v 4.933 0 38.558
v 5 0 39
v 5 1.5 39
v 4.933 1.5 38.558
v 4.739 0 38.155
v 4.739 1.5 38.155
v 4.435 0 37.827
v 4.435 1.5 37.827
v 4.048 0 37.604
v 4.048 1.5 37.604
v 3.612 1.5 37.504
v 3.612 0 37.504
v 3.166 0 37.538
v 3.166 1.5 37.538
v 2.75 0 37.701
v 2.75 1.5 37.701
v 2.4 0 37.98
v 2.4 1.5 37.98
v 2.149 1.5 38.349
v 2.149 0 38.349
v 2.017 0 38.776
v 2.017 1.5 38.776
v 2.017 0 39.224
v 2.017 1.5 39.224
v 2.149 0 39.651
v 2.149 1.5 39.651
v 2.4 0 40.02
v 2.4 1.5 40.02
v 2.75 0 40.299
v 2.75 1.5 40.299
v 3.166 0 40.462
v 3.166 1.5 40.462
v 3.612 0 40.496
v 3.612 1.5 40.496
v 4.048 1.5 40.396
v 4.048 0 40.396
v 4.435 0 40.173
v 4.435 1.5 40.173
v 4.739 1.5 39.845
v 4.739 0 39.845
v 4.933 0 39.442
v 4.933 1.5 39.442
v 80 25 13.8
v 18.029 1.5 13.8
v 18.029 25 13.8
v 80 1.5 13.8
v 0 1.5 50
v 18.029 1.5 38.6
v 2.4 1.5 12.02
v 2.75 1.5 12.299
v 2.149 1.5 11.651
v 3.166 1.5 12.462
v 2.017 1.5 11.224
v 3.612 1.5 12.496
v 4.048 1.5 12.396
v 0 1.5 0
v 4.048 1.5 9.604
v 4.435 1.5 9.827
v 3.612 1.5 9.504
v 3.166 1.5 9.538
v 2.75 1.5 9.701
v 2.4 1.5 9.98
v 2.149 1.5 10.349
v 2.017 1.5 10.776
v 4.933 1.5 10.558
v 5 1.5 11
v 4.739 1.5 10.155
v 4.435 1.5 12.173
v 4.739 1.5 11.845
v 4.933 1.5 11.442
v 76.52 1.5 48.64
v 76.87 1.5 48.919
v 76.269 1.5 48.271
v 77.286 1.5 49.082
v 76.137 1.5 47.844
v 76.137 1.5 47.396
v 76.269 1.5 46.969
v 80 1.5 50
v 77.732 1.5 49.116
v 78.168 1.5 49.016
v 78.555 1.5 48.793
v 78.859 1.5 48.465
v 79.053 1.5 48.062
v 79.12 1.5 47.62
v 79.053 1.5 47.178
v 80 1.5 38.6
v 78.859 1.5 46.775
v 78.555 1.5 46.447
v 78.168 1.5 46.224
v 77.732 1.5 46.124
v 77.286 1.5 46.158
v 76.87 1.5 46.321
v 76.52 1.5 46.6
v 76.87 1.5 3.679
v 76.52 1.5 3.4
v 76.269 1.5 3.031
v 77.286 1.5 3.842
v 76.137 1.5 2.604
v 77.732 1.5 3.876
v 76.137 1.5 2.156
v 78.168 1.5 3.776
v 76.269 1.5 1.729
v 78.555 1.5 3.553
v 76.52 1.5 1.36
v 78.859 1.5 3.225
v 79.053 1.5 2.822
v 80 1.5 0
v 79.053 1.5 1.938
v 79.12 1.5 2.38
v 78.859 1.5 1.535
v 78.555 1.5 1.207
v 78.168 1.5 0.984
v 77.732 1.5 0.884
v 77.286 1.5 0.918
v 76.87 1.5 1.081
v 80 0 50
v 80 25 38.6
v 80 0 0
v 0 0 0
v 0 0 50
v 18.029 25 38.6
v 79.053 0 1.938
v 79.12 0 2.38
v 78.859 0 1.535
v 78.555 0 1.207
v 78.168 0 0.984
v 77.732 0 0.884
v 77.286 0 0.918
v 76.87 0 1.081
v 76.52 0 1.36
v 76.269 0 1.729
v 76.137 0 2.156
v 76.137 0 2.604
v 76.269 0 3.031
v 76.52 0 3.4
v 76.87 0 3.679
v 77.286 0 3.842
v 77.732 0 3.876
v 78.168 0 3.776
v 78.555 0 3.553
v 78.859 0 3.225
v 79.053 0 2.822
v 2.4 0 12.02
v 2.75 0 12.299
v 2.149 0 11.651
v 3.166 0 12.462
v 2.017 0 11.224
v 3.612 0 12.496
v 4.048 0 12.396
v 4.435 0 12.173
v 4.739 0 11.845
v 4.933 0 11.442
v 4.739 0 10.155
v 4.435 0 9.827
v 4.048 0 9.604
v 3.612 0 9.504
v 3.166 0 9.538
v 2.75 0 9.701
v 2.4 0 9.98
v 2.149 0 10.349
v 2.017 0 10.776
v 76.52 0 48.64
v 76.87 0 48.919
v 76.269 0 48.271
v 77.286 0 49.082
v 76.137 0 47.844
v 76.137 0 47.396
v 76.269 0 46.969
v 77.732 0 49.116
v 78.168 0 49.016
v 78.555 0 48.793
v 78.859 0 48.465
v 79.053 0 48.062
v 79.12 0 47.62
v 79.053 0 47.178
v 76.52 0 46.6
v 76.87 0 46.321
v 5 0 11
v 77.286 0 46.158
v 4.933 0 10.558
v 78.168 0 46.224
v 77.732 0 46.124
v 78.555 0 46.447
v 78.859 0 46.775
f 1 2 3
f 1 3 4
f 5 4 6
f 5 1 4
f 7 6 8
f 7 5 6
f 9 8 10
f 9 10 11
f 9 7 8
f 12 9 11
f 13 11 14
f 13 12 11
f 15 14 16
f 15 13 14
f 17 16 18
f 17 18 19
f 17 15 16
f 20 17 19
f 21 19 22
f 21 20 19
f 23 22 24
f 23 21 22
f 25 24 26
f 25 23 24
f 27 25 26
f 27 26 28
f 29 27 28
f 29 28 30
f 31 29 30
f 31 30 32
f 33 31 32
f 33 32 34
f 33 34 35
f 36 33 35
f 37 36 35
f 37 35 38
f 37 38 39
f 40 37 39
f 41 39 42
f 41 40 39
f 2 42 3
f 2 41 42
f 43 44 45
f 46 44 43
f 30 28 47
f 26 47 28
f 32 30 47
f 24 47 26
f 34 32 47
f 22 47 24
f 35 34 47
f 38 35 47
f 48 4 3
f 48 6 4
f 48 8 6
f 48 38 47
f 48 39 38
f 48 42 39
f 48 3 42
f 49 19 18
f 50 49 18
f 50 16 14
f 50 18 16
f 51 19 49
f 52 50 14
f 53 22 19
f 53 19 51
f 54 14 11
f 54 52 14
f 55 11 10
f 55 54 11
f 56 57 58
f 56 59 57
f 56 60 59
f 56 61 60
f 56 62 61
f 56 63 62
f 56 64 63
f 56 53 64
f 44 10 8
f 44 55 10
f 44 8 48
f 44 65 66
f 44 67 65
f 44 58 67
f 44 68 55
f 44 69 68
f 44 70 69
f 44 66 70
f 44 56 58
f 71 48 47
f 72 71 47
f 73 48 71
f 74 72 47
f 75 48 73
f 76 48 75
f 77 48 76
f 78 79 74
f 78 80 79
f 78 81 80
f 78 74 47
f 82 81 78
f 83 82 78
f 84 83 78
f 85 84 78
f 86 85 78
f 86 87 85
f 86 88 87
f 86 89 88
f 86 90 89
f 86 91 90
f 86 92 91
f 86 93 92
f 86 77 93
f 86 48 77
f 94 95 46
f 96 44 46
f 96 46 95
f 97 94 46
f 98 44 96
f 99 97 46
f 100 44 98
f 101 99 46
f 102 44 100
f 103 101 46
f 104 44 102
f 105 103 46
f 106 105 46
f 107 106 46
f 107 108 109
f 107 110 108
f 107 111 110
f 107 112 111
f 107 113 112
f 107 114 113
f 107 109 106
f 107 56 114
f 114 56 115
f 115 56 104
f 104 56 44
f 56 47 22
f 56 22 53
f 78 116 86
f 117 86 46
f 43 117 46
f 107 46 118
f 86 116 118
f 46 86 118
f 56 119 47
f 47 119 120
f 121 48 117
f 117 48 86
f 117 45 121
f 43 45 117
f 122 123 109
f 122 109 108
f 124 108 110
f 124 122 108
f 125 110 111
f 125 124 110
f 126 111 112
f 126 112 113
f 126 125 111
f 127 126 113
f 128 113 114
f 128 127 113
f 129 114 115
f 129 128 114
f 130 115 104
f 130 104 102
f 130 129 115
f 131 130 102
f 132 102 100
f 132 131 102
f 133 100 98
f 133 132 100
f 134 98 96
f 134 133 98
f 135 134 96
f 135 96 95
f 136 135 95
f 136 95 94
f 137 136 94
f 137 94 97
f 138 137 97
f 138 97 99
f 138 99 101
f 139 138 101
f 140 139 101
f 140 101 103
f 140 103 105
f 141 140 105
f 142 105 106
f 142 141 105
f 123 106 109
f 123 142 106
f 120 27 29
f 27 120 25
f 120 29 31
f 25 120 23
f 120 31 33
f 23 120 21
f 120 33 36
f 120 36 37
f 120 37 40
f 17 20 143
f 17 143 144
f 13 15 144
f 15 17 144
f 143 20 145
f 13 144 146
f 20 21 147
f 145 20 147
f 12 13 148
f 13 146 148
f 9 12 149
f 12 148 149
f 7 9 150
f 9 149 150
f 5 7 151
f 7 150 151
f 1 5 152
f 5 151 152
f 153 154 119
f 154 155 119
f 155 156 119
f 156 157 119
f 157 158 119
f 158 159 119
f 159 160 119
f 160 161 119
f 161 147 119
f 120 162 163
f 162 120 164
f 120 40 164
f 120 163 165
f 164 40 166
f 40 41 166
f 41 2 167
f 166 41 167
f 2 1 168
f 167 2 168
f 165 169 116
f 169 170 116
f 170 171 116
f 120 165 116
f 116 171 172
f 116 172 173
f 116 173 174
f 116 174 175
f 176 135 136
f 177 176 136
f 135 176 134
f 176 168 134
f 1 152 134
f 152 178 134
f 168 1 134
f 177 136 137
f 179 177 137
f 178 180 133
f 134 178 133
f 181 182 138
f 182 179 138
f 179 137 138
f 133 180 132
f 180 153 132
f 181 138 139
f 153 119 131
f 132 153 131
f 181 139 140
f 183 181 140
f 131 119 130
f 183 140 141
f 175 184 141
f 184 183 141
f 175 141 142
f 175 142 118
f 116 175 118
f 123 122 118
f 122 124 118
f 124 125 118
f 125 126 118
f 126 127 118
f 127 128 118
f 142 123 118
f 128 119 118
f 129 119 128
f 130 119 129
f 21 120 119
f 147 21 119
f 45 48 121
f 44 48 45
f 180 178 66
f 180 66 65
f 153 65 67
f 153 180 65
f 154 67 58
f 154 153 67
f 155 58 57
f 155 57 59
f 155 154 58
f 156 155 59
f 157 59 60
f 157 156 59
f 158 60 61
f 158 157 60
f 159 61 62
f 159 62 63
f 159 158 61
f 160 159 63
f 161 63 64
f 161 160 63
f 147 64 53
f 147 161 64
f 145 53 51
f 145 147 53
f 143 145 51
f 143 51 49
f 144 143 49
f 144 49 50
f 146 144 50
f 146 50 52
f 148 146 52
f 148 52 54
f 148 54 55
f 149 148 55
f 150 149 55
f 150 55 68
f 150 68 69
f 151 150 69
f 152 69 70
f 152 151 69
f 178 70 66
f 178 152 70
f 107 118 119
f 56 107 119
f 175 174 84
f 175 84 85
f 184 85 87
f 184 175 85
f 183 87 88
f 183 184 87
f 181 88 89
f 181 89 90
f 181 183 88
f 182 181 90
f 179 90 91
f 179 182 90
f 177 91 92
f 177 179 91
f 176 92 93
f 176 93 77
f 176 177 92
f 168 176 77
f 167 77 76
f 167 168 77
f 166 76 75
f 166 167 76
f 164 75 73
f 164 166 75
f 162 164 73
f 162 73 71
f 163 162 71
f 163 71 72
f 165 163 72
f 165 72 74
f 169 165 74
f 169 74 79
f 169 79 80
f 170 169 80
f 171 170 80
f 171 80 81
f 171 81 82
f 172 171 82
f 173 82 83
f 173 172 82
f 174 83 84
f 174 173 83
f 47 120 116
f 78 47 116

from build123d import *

# Parameters (mm, degrees)
SKETCH2_R           = 1.5
BOSS_EXTRUDE1_DEPTH = 1.5
SKETCH2_3_W         = 61.970625282
SKETCH2_3_H         = 24.8
BOSS_EXTRUDE2_DEPTH = 25


with BuildPart() as part:
    # Sketch2 → Boss-Extrude1 (new body)
    with BuildSketch(Plane(origin=(0, 0, 0), x_dir=(1, 0, 0), z_dir=(0, 1, 0))):
        Polygon((80, 0), (0, 0), (0, -50), (80, -50), (80, -38.6), (18.029374718, -38.6), (18.029374718, -13.8), (80, -13.8), align=None)
        with Locations((3.5, -39)):
            Circle(SKETCH2_R, mode=Mode.SUBTRACT)
        with Locations((77.62, -47.62)):
            Circle(SKETCH2_R, mode=Mode.SUBTRACT)
        with Locations((3.5, -11)):
            Circle(SKETCH2_R, mode=Mode.SUBTRACT)
        with Locations((77.62, -2.38)):
            Circle(SKETCH2_R, mode=Mode.SUBTRACT)
    extrude(amount=BOSS_EXTRUDE1_DEPTH)

    # Sketch2<3> → Boss-Extrude2 (add)
    with BuildSketch(Plane(origin=(0, 0, 0), x_dir=(1, 0, 0), z_dir=(0, 1, 0))):
        with Locations((49.014687359, -26.2)):
            Rectangle(SKETCH2_3_W, SKETCH2_3_H)
    extrude(amount=BOSS_EXTRUDE2_DEPTH)


solid = part.part
